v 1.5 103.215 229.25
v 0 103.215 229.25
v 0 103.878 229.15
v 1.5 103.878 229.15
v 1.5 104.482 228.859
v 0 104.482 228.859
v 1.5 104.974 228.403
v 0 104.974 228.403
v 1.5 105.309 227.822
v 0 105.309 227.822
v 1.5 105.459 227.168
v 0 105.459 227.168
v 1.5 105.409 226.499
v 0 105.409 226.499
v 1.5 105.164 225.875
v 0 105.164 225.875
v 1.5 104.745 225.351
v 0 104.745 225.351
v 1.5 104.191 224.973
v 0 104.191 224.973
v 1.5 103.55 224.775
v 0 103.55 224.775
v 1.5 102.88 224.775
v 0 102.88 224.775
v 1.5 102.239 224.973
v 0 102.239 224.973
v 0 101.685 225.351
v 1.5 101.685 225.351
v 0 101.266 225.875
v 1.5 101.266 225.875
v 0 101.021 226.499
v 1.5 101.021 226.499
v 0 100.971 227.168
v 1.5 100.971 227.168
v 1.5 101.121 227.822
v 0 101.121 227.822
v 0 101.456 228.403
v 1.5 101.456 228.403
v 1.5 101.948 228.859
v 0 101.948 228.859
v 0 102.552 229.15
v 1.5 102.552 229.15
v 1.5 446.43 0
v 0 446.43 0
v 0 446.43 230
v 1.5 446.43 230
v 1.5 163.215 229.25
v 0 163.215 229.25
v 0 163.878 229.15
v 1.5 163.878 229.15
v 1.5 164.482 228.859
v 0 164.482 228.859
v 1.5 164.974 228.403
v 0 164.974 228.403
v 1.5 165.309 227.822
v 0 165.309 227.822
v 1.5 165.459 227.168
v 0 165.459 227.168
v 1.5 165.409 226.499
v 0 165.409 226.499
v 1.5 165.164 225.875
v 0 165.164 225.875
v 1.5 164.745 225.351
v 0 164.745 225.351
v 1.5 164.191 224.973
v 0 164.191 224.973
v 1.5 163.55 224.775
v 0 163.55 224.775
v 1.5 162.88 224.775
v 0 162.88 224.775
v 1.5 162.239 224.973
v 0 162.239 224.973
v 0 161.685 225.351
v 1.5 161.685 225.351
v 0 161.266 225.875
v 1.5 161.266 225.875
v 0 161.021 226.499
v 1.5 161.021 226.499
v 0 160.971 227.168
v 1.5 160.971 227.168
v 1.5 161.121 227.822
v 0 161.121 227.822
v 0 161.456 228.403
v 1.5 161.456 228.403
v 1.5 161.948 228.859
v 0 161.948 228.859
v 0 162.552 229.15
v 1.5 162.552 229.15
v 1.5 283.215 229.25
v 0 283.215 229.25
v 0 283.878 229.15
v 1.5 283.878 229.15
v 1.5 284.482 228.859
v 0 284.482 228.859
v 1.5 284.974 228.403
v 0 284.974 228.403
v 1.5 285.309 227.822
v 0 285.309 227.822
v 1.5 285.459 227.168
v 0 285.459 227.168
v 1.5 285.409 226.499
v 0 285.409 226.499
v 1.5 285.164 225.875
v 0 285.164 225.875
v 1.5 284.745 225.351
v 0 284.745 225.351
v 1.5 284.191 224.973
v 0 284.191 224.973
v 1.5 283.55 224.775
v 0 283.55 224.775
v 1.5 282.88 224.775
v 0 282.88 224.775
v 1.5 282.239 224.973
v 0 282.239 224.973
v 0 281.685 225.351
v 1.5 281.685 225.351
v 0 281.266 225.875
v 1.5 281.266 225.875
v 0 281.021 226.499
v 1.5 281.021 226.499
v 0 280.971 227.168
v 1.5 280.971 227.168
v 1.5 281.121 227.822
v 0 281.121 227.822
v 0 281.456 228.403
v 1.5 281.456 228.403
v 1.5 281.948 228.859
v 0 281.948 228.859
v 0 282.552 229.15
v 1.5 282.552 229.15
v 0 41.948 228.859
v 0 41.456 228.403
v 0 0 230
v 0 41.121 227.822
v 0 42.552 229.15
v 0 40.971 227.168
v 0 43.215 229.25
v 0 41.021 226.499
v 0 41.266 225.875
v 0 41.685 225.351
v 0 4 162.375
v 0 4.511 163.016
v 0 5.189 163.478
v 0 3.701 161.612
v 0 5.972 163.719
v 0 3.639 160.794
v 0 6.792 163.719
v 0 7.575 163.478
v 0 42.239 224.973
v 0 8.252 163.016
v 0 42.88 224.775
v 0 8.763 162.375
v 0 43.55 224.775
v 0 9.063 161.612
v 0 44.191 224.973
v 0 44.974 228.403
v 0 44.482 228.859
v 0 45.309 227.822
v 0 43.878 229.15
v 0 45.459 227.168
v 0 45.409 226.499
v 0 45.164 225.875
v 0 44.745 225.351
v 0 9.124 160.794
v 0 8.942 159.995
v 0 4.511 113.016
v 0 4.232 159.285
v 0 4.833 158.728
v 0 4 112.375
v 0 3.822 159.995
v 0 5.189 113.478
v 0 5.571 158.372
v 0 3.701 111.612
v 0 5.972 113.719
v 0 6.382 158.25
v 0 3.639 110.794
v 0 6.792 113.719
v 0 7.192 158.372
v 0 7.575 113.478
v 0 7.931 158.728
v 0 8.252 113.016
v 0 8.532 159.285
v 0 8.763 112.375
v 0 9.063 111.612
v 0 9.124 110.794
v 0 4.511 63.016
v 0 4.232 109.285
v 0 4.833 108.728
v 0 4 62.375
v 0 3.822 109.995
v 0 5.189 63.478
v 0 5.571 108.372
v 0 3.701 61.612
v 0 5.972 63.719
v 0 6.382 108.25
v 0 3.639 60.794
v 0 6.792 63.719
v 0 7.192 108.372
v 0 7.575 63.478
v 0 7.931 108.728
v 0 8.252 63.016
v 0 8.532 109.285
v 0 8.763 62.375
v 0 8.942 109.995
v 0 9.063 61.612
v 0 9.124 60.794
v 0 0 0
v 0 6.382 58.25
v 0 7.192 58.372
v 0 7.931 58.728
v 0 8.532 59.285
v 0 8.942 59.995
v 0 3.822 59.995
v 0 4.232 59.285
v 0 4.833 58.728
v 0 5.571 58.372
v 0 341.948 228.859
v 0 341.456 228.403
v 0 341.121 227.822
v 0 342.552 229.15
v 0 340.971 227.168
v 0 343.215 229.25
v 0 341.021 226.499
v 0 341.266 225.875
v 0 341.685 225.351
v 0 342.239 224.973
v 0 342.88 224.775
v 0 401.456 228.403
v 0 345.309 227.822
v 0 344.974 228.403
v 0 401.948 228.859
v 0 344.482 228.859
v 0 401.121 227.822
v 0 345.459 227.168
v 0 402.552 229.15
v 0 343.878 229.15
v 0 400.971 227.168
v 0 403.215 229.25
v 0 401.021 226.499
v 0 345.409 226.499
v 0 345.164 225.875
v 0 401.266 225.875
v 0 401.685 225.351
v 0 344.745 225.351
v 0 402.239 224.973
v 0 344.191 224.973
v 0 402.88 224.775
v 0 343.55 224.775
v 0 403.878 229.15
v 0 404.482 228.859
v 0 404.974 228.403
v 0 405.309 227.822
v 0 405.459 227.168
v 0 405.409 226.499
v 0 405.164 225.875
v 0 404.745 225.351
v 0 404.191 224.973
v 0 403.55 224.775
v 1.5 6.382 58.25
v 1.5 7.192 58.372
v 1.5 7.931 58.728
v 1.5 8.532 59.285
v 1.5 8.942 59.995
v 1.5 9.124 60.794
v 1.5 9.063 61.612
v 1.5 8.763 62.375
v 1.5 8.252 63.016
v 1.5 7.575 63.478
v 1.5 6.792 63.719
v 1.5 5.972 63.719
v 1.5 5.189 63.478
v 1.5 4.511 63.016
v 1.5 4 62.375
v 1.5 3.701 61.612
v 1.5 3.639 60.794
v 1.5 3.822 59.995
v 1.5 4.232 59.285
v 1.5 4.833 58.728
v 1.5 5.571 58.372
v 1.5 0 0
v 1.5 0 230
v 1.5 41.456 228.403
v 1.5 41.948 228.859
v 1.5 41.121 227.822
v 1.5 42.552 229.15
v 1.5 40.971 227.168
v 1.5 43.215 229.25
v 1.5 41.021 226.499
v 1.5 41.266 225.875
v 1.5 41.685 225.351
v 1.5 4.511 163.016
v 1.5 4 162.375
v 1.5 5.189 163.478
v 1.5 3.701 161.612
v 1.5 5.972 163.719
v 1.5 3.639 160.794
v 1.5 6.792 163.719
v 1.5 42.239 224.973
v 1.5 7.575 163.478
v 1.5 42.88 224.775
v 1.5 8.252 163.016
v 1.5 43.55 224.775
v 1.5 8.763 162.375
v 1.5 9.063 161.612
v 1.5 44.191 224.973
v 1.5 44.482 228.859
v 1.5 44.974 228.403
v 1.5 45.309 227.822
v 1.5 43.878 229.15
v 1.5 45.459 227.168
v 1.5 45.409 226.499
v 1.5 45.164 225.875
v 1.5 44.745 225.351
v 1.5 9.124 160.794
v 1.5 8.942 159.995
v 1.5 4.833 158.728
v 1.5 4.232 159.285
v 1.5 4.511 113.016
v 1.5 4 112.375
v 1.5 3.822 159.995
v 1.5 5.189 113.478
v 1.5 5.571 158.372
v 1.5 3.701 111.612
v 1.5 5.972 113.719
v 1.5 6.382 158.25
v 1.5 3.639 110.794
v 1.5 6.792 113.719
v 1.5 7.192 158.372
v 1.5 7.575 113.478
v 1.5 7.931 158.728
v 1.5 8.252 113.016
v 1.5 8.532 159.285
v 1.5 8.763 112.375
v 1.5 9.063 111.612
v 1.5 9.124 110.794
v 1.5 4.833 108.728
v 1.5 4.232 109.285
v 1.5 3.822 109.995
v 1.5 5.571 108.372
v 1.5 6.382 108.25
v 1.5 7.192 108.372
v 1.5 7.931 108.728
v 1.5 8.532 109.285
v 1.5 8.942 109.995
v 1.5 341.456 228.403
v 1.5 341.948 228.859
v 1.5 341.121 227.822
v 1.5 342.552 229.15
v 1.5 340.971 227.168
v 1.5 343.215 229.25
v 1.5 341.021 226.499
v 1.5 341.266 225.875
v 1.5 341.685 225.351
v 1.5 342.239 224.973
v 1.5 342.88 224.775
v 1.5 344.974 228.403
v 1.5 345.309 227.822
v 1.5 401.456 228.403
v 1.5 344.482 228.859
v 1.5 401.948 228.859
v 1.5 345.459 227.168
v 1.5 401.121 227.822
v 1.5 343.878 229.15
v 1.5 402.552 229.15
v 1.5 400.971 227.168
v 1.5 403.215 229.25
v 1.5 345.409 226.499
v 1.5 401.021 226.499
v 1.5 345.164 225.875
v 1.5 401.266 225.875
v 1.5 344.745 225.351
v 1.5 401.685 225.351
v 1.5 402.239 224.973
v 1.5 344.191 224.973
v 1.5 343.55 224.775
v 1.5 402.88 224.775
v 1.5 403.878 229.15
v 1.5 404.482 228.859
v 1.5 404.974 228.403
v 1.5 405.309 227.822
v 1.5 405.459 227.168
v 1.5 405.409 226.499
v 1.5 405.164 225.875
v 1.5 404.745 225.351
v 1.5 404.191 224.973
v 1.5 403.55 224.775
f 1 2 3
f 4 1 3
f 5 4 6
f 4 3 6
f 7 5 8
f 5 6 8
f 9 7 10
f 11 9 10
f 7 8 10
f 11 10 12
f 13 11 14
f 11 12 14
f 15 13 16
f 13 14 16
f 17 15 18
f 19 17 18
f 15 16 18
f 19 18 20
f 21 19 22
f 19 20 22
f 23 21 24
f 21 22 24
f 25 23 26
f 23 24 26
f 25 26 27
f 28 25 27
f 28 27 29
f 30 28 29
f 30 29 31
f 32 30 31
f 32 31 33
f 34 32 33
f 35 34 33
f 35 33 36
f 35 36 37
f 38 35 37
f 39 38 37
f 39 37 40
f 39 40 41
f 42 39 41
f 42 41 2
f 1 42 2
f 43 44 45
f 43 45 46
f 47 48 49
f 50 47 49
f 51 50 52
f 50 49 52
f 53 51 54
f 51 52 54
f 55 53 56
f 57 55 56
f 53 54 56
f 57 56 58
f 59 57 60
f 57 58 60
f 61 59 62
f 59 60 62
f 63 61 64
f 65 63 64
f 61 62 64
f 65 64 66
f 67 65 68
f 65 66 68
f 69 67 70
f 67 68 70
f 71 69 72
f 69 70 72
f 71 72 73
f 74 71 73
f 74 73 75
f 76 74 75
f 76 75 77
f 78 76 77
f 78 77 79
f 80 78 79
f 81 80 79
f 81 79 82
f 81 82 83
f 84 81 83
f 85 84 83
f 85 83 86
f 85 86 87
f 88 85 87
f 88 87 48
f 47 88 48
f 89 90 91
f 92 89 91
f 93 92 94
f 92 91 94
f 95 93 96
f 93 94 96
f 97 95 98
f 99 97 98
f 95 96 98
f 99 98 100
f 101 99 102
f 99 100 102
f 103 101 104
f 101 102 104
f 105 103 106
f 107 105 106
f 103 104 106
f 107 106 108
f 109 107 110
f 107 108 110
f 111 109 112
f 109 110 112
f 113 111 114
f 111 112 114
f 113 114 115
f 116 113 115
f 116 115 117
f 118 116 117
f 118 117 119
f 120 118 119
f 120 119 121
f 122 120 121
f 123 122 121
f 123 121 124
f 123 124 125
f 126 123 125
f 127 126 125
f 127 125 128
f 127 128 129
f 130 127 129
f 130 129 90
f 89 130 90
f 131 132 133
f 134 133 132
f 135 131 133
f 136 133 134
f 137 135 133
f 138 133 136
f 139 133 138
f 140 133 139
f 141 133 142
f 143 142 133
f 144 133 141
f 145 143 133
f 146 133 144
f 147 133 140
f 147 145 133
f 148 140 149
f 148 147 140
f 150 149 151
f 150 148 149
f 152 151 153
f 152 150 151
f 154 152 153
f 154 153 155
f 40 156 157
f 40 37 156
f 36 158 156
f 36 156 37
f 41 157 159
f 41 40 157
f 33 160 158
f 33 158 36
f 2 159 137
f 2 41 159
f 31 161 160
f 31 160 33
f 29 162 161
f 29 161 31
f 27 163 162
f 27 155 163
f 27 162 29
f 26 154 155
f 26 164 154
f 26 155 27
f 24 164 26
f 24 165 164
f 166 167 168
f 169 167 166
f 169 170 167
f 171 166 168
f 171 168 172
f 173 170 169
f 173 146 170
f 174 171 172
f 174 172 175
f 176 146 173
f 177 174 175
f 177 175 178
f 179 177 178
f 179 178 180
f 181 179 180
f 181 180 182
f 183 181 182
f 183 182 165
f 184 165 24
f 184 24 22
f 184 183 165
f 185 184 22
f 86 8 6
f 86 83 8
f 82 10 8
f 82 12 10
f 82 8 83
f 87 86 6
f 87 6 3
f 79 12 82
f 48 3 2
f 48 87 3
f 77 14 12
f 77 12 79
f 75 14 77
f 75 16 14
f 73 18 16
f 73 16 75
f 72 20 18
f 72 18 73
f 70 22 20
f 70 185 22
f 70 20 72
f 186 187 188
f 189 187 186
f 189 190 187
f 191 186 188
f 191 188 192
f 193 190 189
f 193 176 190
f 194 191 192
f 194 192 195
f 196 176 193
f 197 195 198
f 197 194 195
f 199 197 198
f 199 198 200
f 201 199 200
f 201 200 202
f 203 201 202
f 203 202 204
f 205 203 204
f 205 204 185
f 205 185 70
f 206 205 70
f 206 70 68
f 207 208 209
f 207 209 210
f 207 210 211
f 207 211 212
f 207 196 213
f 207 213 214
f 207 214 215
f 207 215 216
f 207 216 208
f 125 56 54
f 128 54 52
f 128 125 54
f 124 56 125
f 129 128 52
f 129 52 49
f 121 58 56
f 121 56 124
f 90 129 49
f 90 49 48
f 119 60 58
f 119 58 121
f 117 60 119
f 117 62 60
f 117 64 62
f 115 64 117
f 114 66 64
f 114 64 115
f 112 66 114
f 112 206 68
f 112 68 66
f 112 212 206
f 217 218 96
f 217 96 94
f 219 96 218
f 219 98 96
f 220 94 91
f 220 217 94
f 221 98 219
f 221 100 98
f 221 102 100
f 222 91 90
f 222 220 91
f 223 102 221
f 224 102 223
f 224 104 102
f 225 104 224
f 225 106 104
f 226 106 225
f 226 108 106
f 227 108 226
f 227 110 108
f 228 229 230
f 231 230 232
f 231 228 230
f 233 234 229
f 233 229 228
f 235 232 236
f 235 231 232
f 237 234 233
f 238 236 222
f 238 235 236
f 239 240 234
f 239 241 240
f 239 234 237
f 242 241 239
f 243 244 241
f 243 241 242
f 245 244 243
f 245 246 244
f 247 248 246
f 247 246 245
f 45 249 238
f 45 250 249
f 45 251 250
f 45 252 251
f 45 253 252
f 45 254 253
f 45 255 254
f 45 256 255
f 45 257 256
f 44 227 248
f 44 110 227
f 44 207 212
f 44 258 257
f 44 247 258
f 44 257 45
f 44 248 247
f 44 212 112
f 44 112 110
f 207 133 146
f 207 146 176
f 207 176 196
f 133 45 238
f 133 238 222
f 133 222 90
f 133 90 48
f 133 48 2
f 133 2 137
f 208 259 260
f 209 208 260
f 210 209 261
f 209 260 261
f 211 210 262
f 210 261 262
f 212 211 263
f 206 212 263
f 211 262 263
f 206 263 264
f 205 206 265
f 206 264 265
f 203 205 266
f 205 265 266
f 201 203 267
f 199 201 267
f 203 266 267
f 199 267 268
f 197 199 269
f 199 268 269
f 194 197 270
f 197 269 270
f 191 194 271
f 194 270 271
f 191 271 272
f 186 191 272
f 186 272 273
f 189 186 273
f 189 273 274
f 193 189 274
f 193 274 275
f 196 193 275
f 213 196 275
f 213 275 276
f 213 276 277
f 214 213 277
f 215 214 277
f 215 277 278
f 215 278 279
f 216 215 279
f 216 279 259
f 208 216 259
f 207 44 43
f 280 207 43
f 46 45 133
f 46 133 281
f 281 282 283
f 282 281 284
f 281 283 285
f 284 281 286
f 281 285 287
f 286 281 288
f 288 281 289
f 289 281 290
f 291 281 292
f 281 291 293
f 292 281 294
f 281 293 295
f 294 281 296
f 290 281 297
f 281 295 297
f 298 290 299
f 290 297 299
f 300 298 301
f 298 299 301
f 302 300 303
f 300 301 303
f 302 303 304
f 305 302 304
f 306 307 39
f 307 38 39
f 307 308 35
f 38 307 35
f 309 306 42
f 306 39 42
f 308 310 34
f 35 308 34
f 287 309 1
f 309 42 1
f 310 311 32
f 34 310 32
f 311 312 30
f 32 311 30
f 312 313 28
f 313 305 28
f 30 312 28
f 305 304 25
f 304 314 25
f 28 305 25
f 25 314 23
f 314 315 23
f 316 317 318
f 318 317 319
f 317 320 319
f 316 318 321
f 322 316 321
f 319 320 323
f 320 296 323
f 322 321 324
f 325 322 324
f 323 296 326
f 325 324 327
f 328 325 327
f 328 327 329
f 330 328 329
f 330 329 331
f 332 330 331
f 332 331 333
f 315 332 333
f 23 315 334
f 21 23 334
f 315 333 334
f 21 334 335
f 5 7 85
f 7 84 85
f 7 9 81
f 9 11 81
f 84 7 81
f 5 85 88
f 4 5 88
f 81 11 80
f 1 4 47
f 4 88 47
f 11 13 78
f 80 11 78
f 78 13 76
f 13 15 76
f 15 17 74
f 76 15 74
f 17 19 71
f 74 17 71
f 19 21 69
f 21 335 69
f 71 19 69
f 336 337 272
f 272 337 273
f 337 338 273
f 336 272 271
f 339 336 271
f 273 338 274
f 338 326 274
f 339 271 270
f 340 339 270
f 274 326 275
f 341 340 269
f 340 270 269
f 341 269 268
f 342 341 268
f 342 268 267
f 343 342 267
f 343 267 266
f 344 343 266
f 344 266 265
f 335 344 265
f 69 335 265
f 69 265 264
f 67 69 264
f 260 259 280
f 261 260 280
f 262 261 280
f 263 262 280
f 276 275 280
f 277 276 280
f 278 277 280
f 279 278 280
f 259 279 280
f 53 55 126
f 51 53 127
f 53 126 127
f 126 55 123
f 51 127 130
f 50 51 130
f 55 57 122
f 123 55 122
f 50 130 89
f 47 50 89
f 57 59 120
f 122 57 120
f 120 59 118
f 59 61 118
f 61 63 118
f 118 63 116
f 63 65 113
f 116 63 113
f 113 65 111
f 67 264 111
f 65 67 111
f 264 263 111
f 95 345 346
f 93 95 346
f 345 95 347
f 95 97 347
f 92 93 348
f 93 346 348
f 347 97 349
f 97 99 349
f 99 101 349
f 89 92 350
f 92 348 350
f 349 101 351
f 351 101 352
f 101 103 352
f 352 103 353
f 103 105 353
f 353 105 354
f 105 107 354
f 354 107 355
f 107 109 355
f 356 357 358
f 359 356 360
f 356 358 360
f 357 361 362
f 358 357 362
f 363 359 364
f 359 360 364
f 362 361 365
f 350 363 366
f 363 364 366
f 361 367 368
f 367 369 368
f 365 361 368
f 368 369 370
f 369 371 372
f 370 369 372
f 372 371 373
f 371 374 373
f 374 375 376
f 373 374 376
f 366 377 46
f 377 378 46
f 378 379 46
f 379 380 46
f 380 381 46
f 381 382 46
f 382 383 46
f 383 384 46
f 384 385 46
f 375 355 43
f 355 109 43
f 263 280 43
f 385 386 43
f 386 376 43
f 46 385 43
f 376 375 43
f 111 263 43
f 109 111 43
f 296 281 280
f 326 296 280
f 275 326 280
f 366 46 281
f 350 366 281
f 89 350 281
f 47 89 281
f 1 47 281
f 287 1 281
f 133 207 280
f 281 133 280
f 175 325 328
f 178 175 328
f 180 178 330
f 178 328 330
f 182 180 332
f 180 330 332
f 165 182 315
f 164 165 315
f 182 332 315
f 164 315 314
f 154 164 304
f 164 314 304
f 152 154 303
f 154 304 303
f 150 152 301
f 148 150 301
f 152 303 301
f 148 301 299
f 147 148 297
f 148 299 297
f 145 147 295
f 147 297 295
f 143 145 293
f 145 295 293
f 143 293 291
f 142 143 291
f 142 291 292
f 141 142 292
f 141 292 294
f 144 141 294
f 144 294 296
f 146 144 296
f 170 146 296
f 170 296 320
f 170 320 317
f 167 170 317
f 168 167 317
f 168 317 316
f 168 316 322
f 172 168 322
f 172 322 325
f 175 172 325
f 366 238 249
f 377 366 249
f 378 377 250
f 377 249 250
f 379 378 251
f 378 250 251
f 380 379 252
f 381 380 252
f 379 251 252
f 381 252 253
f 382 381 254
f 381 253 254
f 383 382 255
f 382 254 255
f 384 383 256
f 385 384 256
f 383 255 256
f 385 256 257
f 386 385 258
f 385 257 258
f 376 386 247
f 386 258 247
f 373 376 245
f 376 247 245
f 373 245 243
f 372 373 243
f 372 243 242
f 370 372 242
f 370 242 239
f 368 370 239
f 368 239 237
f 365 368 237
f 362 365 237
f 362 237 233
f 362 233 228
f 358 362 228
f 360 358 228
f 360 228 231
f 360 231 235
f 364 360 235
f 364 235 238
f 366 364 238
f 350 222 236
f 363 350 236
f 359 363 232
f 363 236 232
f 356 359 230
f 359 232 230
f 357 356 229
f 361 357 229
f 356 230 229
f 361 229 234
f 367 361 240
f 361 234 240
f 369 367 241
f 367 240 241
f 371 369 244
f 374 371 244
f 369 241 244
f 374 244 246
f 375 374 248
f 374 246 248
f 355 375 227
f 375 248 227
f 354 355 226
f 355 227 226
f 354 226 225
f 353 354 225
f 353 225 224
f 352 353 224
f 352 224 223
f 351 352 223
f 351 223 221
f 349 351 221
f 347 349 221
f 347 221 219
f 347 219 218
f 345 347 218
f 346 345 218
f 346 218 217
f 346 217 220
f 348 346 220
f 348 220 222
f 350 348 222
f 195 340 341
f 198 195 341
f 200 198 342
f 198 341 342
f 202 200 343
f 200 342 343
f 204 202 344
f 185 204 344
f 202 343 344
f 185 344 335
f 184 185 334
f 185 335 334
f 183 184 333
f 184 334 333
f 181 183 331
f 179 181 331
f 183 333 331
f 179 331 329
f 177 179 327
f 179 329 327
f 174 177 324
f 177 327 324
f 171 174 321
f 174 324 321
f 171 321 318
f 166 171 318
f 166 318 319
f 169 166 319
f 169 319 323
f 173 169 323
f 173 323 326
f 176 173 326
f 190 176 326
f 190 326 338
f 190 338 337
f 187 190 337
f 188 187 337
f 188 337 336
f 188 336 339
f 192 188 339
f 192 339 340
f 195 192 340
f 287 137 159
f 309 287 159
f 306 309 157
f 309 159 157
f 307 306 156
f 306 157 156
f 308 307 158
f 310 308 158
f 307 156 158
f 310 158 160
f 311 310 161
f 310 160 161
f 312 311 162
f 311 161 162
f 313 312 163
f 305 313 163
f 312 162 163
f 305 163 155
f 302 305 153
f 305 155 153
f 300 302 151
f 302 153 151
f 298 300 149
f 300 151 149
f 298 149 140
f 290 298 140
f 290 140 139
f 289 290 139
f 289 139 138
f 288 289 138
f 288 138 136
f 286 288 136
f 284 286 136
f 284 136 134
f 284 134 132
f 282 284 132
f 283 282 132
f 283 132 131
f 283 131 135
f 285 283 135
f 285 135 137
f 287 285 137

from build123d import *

# Parameters (mm, degrees)
SKETCH_1_W             = 1.5
SKETCH_1_H             = 446.43
SM_BASE_FLANGE_1_DEPTH = 230
SKETCH_10_R            = 2.75
CUT_EXTRUDE_1_DEPTH    = 20
SKETCH_11_R            = 2.25
CUT_EXTRUDE_2_DEPTH    = 10


# Sheet-metal steps are written as plain solids
with BuildPart() as part:
    # Sketch 1 → 基体-法兰1 (new body)
    with BuildSketch(Plane.XY):
        with Locations((0.75, 223.215)):
            Rectangle(SKETCH_1_W, SKETCH_1_H)
    extrude(amount=SM_BASE_FLANGE_1_DEPTH)

    # 草图10 → 切除-拉伸1 (cut)
    with BuildSketch(Plane(origin=(1.5, 0, 0), x_dir=(0, 0, -1), z_dir=(1, 0, 0))):
        with Locations((-161, 6.3817)):
            Circle(SKETCH_10_R)
        with Locations((-111, 6.3817)):
            Circle(SKETCH_10_R)
        with Locations((-61, 6.3817)):
            Circle(SKETCH_10_R)
    extrude(amount=-CUT_EXTRUDE_1_DEPTH, mode=Mode.SUBTRACT)

    # 草图11 → 切除-拉伸2 (cut)
    with BuildSketch(Plane.ZY):
        with Locations((227, 43.215)):
            Circle(SKETCH_11_R)
        with Locations((227, 103.215)):
            Circle(SKETCH_11_R)
        with Locations((227, 163.215)):
            Circle(SKETCH_11_R)
        with Locations((227, 403.215)):
            Circle(SKETCH_11_R)
        with Locations((227, 343.215)):
            Circle(SKETCH_11_R)
        with Locations((227, 283.215)):
            Circle(SKETCH_11_R)
    extrude(amount=-CUT_EXTRUDE_2_DEPTH, mode=Mode.SUBTRACT)


solid = part.part
